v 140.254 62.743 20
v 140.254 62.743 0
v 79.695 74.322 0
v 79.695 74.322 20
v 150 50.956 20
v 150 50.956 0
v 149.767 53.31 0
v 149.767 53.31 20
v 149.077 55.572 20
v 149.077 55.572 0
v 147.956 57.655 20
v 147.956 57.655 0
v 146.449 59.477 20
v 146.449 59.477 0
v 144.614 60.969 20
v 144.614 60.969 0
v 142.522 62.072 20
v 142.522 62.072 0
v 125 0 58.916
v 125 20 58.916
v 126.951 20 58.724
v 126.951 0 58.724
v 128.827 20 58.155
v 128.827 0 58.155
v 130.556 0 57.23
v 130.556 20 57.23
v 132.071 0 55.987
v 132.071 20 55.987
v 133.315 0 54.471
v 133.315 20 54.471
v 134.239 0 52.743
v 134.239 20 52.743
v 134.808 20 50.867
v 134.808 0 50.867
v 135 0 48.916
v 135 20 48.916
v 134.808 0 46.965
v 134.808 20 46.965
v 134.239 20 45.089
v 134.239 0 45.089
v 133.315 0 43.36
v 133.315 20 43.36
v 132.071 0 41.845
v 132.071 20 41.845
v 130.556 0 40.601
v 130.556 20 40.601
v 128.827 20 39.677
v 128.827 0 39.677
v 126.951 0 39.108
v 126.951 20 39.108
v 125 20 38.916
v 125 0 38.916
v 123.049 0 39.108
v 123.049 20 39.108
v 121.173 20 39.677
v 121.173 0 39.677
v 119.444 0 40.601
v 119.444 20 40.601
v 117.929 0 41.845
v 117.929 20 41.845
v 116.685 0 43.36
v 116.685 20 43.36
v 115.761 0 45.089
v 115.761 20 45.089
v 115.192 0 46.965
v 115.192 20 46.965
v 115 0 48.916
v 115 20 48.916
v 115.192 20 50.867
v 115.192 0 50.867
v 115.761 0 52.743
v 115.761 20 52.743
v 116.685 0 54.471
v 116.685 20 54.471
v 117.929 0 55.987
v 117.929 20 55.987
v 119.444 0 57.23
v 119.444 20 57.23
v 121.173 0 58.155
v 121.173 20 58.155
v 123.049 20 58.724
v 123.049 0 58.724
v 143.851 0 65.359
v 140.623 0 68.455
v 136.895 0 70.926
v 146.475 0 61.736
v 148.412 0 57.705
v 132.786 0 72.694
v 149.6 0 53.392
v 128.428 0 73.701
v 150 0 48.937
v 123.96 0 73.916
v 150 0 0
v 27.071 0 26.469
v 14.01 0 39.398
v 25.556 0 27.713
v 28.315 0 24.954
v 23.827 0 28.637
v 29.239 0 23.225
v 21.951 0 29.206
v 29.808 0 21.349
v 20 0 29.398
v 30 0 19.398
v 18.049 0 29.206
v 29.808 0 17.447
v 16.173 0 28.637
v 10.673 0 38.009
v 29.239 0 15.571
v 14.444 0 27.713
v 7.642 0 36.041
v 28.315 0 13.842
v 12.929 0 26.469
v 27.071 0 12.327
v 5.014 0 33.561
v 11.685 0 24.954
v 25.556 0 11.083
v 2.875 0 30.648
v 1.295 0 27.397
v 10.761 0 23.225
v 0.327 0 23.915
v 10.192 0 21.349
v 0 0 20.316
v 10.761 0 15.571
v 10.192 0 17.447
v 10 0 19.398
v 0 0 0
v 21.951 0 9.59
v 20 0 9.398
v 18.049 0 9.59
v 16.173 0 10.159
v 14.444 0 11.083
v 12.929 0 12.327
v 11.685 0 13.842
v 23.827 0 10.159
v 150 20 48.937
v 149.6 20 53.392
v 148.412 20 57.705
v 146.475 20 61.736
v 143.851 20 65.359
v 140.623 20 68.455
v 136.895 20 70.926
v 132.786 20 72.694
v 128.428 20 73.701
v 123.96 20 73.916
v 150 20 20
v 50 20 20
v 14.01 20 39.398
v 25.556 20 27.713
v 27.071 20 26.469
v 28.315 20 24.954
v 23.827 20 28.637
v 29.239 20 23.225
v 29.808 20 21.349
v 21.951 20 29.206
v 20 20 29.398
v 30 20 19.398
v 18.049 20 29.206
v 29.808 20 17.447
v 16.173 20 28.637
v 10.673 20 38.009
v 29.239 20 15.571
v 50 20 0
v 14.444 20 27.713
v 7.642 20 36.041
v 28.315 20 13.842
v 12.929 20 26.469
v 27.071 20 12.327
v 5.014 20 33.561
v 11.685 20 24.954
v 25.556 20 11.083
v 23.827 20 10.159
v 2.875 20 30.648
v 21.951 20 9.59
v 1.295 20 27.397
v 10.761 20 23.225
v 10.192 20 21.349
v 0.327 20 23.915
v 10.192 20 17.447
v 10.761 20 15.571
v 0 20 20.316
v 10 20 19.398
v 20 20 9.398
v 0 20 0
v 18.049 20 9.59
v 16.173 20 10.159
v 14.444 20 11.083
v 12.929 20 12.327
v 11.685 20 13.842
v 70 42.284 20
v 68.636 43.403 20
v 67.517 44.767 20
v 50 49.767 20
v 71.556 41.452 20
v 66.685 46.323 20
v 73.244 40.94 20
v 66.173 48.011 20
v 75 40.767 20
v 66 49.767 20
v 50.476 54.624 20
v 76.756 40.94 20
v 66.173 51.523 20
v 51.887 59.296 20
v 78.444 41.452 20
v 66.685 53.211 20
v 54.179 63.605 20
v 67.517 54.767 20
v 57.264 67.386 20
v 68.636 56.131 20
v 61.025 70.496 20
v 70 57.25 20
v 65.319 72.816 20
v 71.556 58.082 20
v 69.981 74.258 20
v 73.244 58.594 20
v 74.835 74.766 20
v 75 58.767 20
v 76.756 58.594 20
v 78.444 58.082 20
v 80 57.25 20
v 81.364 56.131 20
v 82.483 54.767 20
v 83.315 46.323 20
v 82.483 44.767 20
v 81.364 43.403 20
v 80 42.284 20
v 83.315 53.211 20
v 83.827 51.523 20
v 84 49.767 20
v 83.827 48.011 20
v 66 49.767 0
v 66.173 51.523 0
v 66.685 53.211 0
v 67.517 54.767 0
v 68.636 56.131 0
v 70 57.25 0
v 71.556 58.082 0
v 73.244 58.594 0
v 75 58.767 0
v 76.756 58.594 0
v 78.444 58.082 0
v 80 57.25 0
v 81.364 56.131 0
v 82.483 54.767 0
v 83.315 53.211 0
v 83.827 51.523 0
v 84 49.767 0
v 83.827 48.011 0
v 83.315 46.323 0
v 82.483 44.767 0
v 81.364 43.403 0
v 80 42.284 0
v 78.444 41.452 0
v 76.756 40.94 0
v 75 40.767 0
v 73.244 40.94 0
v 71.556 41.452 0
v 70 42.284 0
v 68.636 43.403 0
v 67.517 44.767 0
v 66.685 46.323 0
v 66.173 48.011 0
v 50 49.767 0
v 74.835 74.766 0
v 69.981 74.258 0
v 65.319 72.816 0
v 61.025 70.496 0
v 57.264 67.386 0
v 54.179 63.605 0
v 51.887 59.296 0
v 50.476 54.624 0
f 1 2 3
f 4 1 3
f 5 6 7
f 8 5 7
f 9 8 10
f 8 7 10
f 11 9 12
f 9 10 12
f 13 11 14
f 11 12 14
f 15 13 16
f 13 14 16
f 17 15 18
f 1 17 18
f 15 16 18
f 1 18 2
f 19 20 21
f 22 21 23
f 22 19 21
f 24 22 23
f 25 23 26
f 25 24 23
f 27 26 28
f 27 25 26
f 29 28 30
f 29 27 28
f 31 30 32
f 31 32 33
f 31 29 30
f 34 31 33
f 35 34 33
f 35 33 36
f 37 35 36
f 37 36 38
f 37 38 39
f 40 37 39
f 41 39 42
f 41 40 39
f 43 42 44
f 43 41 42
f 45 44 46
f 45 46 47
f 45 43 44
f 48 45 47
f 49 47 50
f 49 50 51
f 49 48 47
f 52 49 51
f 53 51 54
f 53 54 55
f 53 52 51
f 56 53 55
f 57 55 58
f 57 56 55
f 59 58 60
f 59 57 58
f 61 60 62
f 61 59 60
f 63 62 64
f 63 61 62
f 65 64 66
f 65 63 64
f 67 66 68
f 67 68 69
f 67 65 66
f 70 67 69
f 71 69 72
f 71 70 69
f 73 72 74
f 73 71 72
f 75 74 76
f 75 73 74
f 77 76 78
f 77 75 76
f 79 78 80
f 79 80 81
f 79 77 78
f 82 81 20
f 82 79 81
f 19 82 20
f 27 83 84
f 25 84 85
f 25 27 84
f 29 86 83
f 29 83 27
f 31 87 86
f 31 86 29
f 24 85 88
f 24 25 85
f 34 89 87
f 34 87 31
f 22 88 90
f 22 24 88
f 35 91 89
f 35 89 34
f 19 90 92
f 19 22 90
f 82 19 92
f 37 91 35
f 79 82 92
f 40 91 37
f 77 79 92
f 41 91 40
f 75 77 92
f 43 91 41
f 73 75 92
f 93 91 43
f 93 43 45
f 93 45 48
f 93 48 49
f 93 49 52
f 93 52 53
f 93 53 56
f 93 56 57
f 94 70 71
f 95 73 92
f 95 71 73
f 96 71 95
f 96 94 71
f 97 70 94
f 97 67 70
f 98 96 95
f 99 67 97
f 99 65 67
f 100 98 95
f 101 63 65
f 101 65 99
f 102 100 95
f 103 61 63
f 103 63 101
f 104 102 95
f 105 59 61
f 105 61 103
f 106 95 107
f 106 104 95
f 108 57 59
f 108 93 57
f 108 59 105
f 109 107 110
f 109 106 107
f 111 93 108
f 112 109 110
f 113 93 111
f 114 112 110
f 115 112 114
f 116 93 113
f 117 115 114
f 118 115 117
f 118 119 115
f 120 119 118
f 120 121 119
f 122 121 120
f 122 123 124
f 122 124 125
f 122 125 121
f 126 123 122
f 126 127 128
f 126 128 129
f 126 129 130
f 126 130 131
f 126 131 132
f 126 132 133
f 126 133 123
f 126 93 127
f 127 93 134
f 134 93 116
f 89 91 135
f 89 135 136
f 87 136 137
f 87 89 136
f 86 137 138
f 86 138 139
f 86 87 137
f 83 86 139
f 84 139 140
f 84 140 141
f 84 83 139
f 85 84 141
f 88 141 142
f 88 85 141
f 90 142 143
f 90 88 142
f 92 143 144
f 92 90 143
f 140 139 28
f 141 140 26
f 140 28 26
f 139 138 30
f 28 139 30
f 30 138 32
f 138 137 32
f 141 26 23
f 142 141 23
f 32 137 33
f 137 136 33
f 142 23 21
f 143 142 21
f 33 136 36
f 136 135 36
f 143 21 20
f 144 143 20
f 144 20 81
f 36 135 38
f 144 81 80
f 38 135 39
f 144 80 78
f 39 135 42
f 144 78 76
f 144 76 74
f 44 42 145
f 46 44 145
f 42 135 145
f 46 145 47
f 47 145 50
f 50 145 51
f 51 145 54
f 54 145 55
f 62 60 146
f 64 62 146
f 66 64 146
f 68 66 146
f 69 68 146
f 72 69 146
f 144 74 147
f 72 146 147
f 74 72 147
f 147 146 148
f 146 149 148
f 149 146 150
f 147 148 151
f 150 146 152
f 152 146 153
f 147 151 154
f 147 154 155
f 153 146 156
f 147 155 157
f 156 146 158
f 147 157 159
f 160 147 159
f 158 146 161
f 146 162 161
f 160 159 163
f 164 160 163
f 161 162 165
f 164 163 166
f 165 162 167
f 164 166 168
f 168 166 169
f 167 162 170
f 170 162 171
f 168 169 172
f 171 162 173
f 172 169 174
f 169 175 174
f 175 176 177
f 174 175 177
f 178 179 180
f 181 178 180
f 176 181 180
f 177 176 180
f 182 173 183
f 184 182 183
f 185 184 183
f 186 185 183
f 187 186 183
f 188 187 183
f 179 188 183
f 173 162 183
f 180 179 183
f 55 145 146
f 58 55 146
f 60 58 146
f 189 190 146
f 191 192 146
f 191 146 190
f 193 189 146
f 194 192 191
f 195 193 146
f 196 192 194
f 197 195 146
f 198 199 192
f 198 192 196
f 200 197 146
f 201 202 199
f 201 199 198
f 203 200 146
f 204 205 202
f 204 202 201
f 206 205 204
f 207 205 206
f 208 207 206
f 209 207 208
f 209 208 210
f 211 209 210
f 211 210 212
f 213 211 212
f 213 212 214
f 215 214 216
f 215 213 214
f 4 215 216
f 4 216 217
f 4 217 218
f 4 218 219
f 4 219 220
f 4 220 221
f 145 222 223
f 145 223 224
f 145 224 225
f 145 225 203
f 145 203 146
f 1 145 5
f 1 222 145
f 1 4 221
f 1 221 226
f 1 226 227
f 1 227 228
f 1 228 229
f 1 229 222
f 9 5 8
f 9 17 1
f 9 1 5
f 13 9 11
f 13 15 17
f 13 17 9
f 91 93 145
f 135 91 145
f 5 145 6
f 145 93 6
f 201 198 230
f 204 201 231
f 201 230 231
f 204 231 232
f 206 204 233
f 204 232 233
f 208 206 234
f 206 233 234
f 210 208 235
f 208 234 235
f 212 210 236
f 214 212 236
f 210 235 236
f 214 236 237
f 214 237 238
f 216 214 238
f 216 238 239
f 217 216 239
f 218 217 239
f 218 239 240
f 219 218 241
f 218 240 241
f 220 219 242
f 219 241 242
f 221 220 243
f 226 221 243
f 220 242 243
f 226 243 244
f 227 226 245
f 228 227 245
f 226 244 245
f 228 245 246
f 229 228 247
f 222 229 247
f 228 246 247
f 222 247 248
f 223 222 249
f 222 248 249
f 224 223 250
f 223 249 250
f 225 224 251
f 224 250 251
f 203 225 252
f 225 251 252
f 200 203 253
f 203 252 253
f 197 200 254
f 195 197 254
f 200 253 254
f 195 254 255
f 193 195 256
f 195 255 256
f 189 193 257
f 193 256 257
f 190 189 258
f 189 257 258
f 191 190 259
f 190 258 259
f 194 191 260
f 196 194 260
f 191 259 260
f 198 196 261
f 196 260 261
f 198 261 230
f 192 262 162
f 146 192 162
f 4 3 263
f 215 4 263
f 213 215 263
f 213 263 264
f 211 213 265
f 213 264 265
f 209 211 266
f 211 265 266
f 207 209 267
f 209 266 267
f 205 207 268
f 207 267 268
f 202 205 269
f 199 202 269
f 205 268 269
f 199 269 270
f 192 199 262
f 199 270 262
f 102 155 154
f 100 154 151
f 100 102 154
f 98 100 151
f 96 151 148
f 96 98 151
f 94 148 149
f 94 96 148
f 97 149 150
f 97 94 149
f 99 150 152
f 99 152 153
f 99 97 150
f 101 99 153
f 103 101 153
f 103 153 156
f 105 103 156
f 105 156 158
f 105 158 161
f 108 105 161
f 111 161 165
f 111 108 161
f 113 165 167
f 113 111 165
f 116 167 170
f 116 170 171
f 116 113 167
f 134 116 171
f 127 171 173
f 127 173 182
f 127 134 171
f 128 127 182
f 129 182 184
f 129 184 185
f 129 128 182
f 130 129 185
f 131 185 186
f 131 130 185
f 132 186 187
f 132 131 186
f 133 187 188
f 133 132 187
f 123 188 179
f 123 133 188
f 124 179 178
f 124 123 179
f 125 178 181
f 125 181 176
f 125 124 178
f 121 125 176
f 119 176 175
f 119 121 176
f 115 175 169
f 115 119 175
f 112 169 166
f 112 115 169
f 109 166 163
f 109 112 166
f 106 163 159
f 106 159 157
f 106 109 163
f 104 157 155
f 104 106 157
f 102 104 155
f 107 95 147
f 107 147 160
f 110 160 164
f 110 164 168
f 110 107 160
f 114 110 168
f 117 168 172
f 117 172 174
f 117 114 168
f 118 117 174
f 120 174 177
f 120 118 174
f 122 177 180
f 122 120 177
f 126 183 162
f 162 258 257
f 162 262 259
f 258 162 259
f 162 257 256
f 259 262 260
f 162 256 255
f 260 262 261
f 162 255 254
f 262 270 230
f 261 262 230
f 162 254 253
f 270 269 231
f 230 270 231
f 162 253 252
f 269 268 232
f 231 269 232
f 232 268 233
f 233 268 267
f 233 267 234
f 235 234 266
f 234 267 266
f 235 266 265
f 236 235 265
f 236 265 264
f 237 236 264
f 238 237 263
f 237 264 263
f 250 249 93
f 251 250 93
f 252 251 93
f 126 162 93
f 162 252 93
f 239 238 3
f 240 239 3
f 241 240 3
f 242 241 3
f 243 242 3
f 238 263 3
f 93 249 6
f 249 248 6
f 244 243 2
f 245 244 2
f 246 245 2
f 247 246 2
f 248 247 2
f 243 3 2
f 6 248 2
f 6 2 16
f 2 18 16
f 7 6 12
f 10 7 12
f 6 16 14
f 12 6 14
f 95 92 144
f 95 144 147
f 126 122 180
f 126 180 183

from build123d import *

# Parameters (mm, degrees)
SKETCH_1_R      = 10
EXTRUDE_1_DEPTH = 20
SKETCH_3_R      = 9
EXTRUDE_3_DEPTH = 20


with BuildPart() as part:
    # 草圖1 → 填料-伸長1 (new body)
    with BuildSketch(Plane(origin=(0, 0, 0), x_dir=(1, 0, 0), z_dir=(0, 1, 0))):
        with BuildLine():
            Line((0, 0), (150, 0))
            Line((150, 0), (150, -48.937372985))
            ThreePointArc((150, -48.937372985), (142.306045532, -66.979013377), (123.959936956, -73.915728993))
            Line((123.959936956, -73.915728993), (14.009507708, -39.398116187))
            ThreePointArc((14.009507708, -39.398116187), (3.878432988, -32.15252135), (0, -20.316344726))
            Line((0, -20.316344726), (0, 0))
        make_face()
        with Locations(Location((20, -19.398116187, 0), (0, 0, 270))):
            Circle(SKETCH_1_R, mode=Mode.SUBTRACT)
        with Locations(Location((125, -48.915728993, 0), (0, 0, 270))):
            Circle(SKETCH_1_R, mode=Mode.SUBTRACT)
    extrude(amount=EXTRUDE_1_DEPTH)

    # 草圖3 → 填料-伸長3 (add)
    with BuildSketch(Plane(origin=(0, 0, 0), x_dir=(-1, 0, 0), z_dir=(0, 0, -1))):
        with BuildLine():
            Line((-150, 20), (-150, 50.956093838))
            ThreePointArc((-150, 50.956093838), (-147.247819565, 58.603173888), (-140.253694451, 62.742563256))
            Line((-140.253694451, 62.742563256), (-79.695196774, 74.321972269))
            ThreePointArc((-79.695196774, 74.321972269), (-59.068583229, 69.033118411), (-50, 49.76682765))
            Line((-50, 49.76682765), (-50, 20))
            Line((-50, 20), (-150, 20))
        make_face()
        with Locations((-75, 49.76682765)):
            Circle(SKETCH_3_R, mode=Mode.SUBTRACT)
    extrude(amount=-EXTRUDE_3_DEPTH)


solid = part.part
